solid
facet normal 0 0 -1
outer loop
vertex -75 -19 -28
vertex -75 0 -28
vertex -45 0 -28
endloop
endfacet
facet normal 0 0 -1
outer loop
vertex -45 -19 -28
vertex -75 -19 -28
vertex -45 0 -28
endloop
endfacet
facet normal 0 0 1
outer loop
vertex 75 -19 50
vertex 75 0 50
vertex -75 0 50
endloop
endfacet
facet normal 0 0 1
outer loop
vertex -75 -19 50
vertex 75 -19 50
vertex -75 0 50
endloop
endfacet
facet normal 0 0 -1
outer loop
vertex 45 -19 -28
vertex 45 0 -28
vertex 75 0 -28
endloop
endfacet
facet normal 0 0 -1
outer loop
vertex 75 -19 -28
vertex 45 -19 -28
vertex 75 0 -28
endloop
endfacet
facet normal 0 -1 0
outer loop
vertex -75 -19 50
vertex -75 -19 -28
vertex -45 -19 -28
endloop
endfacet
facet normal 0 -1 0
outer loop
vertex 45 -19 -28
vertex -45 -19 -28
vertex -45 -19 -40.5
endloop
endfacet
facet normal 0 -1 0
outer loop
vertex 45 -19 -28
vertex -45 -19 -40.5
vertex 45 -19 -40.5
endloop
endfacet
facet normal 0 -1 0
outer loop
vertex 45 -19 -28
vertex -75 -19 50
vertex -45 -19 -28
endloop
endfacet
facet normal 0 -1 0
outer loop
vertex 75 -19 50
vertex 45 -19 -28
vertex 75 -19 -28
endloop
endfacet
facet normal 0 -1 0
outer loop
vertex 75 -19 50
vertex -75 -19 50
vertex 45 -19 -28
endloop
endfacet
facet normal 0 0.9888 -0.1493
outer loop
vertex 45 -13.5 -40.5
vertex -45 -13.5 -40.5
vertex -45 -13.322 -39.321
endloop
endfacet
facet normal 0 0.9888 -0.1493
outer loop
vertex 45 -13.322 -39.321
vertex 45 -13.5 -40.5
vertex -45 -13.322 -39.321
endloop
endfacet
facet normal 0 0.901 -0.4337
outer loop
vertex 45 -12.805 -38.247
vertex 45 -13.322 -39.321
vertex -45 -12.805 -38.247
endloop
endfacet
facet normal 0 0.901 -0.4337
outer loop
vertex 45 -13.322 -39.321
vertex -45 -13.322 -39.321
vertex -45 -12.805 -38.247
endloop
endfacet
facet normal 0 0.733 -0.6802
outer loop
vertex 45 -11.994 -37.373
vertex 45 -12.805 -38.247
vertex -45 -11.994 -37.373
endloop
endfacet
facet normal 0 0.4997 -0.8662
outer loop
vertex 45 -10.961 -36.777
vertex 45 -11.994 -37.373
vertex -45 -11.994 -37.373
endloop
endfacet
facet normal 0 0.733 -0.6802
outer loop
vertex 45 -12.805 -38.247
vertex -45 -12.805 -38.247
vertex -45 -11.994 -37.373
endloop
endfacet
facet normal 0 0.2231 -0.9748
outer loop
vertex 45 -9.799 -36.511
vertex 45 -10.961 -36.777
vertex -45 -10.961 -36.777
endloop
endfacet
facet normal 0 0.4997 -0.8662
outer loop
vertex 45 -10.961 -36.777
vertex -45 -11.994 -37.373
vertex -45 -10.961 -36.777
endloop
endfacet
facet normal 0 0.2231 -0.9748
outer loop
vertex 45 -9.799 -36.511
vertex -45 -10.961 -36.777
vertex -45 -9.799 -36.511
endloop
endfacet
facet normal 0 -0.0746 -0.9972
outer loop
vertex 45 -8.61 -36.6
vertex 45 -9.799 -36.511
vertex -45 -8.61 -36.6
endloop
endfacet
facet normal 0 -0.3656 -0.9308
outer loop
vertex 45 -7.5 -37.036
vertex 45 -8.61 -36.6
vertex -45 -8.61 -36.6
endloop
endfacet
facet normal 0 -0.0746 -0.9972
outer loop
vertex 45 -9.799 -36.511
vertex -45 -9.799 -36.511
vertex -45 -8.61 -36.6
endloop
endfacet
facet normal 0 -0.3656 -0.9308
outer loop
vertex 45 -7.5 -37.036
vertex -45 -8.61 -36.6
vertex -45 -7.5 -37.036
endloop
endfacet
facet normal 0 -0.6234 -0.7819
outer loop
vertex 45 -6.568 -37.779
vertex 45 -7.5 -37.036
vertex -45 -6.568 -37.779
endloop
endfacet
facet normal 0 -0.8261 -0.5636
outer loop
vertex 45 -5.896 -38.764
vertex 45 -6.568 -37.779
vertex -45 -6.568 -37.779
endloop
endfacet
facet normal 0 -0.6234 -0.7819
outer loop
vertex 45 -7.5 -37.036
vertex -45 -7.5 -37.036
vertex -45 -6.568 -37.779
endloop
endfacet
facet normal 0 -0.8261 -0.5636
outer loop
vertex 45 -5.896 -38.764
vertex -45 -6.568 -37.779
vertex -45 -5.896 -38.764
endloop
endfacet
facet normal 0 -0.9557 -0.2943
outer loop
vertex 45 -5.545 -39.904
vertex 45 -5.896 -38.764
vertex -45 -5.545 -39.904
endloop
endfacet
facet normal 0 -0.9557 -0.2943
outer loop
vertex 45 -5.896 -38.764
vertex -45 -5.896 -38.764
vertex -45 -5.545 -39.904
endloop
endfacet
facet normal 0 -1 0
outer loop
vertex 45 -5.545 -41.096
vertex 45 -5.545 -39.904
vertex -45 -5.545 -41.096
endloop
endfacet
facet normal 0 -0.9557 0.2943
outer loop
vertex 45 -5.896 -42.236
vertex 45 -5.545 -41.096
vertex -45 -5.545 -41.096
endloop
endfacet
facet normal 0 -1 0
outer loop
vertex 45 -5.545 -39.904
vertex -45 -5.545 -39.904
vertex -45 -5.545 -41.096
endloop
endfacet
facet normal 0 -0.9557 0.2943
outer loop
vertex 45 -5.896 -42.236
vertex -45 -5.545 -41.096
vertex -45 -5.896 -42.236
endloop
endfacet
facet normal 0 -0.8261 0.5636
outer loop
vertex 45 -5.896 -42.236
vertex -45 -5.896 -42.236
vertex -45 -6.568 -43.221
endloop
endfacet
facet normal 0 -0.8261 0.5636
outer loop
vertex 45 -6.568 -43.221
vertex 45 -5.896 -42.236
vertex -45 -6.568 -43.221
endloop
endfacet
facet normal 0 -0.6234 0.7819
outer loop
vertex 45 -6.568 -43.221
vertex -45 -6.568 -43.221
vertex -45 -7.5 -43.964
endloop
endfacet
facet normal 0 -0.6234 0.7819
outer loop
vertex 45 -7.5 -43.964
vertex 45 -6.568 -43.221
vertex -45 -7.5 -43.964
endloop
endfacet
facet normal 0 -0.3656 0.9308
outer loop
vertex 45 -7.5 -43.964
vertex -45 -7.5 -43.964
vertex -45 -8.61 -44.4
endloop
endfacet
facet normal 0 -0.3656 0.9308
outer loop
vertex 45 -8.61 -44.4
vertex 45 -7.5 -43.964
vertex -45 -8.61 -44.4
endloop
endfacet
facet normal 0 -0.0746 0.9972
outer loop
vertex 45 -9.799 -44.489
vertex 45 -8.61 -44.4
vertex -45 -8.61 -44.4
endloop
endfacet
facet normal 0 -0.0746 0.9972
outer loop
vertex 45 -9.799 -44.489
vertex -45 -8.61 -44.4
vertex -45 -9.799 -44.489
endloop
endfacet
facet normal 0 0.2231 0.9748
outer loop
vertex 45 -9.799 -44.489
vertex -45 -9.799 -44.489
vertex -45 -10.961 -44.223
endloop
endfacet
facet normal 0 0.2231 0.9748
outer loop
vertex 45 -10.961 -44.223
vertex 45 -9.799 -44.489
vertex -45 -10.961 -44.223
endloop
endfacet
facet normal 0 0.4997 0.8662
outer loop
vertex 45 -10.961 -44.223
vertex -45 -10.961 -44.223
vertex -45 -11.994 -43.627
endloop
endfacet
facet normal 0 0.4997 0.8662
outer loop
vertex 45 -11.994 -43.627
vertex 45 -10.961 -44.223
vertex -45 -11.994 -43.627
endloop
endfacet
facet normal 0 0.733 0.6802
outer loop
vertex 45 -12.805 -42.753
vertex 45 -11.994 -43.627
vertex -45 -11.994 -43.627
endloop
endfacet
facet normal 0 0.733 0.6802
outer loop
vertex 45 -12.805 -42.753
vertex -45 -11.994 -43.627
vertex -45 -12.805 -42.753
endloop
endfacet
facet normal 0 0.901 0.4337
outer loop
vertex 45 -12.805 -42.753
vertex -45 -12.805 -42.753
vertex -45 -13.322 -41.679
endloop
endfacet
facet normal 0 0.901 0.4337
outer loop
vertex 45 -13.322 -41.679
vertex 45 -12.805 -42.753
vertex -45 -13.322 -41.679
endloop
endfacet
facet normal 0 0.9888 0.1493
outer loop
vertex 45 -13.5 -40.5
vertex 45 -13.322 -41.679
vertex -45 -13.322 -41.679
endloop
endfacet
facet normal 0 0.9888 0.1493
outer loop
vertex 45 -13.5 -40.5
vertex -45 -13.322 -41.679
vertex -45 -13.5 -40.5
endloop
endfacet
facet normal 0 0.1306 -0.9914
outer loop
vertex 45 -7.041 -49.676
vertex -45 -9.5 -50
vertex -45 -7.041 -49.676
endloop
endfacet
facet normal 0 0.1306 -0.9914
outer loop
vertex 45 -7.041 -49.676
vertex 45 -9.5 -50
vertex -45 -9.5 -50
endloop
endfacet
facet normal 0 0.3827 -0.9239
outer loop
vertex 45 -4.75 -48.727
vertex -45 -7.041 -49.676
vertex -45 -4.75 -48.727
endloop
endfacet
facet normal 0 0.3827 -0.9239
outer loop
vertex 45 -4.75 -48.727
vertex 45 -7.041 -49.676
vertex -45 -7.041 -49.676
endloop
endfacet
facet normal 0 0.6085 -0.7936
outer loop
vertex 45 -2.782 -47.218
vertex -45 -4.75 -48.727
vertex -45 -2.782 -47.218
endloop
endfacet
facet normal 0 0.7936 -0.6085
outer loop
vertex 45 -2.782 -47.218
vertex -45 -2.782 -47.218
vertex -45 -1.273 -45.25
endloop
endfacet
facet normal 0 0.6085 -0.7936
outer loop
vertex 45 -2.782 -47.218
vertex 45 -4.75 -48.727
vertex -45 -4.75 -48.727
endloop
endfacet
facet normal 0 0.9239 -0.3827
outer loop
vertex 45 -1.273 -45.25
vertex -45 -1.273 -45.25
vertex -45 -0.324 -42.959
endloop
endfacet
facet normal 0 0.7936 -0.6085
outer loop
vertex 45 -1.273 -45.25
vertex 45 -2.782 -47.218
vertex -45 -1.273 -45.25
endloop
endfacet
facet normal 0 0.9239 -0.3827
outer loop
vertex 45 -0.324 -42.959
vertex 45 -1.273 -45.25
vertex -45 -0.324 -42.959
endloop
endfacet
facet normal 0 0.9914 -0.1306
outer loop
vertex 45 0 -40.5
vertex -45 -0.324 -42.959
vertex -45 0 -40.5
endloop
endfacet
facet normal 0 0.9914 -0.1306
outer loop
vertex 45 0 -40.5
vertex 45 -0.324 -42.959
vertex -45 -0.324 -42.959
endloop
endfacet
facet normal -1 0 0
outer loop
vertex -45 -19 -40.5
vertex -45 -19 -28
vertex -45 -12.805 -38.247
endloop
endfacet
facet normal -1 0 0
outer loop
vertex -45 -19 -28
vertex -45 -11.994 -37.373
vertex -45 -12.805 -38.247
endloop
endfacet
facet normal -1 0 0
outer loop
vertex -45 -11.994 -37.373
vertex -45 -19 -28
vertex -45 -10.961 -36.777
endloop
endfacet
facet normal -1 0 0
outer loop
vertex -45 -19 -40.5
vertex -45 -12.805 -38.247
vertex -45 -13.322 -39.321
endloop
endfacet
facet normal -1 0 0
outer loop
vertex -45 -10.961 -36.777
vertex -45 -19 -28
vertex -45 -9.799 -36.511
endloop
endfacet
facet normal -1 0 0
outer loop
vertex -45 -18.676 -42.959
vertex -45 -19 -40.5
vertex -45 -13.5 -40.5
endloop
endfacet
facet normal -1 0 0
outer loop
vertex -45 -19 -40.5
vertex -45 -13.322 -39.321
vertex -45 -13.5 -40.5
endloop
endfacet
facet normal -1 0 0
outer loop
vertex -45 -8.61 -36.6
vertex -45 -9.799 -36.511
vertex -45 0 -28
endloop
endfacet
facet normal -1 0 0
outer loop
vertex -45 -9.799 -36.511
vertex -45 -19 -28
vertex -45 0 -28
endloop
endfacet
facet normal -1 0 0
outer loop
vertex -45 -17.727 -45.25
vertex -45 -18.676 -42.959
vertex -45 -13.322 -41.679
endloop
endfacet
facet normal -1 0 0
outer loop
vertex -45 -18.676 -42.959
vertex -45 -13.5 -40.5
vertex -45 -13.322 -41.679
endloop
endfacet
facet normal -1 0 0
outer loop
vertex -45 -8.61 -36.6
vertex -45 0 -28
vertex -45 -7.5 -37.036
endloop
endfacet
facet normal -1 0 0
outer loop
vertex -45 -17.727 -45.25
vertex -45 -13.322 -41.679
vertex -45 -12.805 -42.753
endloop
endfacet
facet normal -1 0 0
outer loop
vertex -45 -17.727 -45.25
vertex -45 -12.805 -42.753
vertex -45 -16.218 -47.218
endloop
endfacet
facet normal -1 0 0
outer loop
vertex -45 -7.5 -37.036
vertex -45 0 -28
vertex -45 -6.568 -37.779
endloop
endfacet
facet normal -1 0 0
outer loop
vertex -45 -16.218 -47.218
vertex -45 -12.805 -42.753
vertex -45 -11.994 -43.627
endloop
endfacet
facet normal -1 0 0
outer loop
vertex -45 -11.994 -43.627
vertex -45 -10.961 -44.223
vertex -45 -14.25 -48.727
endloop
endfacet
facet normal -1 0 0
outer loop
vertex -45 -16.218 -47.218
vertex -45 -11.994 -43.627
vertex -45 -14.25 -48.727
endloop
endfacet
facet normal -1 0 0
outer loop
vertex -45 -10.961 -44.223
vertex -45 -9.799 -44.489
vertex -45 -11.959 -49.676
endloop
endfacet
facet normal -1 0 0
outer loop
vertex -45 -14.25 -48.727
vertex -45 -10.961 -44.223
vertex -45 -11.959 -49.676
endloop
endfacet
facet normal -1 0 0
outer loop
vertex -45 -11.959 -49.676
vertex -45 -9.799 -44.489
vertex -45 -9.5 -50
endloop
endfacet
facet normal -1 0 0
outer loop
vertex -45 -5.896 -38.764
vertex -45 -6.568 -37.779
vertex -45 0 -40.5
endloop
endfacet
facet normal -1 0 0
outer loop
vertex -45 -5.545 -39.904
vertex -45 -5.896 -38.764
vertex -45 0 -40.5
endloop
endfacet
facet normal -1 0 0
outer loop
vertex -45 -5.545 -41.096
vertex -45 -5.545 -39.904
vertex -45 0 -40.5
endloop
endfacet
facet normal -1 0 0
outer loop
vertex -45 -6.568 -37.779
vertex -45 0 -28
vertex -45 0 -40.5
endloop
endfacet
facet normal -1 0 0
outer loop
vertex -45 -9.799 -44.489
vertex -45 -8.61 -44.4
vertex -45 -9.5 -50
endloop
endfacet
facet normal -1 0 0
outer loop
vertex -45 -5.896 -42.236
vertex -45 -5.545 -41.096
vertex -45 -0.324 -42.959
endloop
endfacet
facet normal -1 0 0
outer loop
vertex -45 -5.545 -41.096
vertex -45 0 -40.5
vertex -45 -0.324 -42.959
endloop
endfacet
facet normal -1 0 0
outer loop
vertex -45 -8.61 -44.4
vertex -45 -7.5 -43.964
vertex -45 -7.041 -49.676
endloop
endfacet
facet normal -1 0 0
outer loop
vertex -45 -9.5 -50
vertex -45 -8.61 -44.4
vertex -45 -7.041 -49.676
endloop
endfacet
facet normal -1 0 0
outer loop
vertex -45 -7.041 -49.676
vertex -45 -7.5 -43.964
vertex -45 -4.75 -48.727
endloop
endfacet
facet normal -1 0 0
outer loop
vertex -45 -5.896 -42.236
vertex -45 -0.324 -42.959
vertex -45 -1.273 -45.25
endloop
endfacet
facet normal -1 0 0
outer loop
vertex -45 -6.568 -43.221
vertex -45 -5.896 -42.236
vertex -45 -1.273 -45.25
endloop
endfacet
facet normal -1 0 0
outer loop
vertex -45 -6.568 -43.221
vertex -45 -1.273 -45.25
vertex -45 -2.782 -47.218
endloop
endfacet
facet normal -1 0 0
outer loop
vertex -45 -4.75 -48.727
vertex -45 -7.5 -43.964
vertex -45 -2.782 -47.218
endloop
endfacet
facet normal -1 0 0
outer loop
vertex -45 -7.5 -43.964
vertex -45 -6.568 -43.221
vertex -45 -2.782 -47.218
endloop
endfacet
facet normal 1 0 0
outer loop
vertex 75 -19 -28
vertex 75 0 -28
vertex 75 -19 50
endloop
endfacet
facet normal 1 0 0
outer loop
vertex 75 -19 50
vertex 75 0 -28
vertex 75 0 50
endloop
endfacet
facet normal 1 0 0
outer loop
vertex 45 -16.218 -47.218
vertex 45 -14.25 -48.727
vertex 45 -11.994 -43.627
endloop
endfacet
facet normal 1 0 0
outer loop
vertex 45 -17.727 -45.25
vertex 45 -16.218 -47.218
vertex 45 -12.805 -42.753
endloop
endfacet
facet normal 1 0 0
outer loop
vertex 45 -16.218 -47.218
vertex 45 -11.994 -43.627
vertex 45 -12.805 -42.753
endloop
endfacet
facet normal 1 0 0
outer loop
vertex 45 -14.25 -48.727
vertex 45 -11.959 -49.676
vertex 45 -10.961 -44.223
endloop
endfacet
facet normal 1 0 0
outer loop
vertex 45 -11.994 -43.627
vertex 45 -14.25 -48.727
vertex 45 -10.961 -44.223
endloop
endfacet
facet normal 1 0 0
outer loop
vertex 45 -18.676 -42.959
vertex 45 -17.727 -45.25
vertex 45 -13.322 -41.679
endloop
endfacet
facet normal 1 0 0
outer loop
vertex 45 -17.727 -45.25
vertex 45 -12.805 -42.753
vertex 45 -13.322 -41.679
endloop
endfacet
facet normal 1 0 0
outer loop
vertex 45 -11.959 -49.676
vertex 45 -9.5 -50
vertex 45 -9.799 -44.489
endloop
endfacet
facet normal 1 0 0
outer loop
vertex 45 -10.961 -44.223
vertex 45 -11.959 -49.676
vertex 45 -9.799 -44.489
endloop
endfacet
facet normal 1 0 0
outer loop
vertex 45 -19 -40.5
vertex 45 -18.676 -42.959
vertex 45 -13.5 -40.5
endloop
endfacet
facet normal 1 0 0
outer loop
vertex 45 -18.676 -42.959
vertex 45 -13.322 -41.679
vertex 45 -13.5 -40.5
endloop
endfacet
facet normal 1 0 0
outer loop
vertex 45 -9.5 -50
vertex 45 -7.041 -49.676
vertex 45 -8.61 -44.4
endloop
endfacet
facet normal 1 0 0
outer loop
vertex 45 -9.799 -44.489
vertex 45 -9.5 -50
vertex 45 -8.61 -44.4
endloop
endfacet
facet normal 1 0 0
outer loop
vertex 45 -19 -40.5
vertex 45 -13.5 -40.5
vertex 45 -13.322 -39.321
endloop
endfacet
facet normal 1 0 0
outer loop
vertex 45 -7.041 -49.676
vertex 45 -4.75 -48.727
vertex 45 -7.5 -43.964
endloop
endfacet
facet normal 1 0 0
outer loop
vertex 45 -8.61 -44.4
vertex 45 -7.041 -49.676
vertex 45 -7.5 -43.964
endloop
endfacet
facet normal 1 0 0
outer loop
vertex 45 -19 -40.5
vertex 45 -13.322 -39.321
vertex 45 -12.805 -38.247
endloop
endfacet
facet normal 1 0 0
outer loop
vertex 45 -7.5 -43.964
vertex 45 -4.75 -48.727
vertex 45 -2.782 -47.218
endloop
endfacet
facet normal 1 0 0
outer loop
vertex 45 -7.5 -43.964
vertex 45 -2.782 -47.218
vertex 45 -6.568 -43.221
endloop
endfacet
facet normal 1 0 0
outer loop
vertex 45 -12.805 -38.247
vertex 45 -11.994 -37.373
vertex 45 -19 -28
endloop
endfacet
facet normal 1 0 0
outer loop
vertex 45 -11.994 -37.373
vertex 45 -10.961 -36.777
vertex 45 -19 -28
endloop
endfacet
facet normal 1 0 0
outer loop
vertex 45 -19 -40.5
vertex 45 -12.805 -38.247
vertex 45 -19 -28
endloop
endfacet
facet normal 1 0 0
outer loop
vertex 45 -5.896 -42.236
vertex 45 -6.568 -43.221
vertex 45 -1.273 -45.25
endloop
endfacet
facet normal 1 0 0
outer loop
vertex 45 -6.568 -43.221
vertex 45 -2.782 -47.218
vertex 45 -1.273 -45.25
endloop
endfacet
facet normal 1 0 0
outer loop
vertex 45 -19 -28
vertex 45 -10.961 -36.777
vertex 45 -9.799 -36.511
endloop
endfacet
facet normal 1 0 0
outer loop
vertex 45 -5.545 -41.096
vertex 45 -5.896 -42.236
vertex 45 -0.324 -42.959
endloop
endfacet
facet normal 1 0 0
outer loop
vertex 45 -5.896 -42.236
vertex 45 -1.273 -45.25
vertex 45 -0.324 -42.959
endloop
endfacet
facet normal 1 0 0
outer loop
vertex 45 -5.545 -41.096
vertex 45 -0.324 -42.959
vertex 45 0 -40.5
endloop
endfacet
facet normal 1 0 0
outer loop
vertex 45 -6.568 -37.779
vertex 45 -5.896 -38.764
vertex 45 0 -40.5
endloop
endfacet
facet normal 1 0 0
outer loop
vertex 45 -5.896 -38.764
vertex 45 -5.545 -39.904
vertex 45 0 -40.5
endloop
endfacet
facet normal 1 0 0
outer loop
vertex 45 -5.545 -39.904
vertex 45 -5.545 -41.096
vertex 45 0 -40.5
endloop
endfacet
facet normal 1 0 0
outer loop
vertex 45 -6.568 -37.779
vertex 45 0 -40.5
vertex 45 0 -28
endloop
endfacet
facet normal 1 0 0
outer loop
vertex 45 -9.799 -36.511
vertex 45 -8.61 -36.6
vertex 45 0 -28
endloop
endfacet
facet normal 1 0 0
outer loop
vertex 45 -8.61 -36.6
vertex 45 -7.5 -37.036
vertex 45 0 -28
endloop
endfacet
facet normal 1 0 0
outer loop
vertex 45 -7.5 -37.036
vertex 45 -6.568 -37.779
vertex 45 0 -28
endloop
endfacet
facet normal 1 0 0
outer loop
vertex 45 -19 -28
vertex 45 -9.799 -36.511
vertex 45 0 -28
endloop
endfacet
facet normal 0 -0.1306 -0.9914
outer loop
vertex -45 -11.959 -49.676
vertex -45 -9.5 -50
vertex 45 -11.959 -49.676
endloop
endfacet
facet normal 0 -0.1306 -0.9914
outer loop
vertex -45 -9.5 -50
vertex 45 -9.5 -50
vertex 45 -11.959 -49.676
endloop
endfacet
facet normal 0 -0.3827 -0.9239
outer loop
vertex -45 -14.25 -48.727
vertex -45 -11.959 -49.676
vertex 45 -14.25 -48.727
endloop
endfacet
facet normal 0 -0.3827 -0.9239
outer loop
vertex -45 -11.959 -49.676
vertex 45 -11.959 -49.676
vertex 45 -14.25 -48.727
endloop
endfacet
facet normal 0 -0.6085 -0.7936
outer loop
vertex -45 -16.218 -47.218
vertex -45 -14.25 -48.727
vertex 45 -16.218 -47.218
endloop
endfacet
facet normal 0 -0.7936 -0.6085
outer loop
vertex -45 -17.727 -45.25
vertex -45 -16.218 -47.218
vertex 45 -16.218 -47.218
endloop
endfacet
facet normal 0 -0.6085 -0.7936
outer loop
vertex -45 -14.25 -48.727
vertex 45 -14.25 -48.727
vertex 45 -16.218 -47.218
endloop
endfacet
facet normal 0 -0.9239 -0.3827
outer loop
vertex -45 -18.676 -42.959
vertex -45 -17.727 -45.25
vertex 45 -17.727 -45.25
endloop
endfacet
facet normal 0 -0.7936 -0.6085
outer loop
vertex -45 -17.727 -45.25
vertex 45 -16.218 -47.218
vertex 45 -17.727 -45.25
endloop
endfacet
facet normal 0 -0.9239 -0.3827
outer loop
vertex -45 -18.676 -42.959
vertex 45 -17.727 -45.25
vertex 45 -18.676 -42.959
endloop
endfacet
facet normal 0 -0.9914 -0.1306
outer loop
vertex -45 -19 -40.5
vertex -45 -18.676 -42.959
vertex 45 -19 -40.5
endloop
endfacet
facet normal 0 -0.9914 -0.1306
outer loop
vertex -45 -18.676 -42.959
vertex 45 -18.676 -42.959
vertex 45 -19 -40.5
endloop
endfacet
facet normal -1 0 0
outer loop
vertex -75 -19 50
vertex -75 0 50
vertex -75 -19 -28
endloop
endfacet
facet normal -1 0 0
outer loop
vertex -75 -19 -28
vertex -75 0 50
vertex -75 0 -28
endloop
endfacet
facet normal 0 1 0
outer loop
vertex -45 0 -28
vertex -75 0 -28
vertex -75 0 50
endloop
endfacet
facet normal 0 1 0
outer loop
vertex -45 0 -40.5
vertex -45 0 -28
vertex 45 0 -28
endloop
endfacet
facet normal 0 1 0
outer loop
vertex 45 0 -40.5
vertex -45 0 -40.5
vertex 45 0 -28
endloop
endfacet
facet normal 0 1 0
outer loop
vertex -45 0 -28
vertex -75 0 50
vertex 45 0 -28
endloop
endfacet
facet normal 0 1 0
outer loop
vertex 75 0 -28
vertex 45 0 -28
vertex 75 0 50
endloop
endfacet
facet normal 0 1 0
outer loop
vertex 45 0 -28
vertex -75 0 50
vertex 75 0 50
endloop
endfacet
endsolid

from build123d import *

# Parameters (mm, degrees)
F1_DEPTH = 19
F2_R     = 4
F3_DEPTH = 120.001
F4_R     = 9.49999


# Not quite as in the source:
# - a fillet or chamfer is up to 0.001 mm smaller than in the source, because OpenCascade refuses the exact size


with BuildPart() as f1:
    # F0 (on Front) → F1 (new body)
    with BuildSketch(Plane.XZ):
        Polygon((-45, -50), (45, -50), (45, -28), (75, -28), (75, 50), (-75, 50), (-75, -28), (-45, -28), align=None)
    extrude(amount=F1_DEPTH)

    # F2 (on face) → F3 (cut, through all)
    with BuildSketch(Plane(origin=(-45, 0, 0), x_dir=(0, -1, 0), z_dir=(-1, 0, 0))):
        with Locations((9.5, -40.5)):
            Circle(F2_R)
    extrude(amount=-F3_DEPTH, mode=Mode.SUBTRACT)

    # F4 (radius 9.5 in the source; OpenCascade refuses exactly that, so slightly less here)
    f4_edges = [f1.edges().sort_by_distance(p)[0] for p in [
        (0, 0, -50),
        (0, -19, -50),
    ]]
    fillet(f4_edges, radius=F4_R)


solid = f1.part
